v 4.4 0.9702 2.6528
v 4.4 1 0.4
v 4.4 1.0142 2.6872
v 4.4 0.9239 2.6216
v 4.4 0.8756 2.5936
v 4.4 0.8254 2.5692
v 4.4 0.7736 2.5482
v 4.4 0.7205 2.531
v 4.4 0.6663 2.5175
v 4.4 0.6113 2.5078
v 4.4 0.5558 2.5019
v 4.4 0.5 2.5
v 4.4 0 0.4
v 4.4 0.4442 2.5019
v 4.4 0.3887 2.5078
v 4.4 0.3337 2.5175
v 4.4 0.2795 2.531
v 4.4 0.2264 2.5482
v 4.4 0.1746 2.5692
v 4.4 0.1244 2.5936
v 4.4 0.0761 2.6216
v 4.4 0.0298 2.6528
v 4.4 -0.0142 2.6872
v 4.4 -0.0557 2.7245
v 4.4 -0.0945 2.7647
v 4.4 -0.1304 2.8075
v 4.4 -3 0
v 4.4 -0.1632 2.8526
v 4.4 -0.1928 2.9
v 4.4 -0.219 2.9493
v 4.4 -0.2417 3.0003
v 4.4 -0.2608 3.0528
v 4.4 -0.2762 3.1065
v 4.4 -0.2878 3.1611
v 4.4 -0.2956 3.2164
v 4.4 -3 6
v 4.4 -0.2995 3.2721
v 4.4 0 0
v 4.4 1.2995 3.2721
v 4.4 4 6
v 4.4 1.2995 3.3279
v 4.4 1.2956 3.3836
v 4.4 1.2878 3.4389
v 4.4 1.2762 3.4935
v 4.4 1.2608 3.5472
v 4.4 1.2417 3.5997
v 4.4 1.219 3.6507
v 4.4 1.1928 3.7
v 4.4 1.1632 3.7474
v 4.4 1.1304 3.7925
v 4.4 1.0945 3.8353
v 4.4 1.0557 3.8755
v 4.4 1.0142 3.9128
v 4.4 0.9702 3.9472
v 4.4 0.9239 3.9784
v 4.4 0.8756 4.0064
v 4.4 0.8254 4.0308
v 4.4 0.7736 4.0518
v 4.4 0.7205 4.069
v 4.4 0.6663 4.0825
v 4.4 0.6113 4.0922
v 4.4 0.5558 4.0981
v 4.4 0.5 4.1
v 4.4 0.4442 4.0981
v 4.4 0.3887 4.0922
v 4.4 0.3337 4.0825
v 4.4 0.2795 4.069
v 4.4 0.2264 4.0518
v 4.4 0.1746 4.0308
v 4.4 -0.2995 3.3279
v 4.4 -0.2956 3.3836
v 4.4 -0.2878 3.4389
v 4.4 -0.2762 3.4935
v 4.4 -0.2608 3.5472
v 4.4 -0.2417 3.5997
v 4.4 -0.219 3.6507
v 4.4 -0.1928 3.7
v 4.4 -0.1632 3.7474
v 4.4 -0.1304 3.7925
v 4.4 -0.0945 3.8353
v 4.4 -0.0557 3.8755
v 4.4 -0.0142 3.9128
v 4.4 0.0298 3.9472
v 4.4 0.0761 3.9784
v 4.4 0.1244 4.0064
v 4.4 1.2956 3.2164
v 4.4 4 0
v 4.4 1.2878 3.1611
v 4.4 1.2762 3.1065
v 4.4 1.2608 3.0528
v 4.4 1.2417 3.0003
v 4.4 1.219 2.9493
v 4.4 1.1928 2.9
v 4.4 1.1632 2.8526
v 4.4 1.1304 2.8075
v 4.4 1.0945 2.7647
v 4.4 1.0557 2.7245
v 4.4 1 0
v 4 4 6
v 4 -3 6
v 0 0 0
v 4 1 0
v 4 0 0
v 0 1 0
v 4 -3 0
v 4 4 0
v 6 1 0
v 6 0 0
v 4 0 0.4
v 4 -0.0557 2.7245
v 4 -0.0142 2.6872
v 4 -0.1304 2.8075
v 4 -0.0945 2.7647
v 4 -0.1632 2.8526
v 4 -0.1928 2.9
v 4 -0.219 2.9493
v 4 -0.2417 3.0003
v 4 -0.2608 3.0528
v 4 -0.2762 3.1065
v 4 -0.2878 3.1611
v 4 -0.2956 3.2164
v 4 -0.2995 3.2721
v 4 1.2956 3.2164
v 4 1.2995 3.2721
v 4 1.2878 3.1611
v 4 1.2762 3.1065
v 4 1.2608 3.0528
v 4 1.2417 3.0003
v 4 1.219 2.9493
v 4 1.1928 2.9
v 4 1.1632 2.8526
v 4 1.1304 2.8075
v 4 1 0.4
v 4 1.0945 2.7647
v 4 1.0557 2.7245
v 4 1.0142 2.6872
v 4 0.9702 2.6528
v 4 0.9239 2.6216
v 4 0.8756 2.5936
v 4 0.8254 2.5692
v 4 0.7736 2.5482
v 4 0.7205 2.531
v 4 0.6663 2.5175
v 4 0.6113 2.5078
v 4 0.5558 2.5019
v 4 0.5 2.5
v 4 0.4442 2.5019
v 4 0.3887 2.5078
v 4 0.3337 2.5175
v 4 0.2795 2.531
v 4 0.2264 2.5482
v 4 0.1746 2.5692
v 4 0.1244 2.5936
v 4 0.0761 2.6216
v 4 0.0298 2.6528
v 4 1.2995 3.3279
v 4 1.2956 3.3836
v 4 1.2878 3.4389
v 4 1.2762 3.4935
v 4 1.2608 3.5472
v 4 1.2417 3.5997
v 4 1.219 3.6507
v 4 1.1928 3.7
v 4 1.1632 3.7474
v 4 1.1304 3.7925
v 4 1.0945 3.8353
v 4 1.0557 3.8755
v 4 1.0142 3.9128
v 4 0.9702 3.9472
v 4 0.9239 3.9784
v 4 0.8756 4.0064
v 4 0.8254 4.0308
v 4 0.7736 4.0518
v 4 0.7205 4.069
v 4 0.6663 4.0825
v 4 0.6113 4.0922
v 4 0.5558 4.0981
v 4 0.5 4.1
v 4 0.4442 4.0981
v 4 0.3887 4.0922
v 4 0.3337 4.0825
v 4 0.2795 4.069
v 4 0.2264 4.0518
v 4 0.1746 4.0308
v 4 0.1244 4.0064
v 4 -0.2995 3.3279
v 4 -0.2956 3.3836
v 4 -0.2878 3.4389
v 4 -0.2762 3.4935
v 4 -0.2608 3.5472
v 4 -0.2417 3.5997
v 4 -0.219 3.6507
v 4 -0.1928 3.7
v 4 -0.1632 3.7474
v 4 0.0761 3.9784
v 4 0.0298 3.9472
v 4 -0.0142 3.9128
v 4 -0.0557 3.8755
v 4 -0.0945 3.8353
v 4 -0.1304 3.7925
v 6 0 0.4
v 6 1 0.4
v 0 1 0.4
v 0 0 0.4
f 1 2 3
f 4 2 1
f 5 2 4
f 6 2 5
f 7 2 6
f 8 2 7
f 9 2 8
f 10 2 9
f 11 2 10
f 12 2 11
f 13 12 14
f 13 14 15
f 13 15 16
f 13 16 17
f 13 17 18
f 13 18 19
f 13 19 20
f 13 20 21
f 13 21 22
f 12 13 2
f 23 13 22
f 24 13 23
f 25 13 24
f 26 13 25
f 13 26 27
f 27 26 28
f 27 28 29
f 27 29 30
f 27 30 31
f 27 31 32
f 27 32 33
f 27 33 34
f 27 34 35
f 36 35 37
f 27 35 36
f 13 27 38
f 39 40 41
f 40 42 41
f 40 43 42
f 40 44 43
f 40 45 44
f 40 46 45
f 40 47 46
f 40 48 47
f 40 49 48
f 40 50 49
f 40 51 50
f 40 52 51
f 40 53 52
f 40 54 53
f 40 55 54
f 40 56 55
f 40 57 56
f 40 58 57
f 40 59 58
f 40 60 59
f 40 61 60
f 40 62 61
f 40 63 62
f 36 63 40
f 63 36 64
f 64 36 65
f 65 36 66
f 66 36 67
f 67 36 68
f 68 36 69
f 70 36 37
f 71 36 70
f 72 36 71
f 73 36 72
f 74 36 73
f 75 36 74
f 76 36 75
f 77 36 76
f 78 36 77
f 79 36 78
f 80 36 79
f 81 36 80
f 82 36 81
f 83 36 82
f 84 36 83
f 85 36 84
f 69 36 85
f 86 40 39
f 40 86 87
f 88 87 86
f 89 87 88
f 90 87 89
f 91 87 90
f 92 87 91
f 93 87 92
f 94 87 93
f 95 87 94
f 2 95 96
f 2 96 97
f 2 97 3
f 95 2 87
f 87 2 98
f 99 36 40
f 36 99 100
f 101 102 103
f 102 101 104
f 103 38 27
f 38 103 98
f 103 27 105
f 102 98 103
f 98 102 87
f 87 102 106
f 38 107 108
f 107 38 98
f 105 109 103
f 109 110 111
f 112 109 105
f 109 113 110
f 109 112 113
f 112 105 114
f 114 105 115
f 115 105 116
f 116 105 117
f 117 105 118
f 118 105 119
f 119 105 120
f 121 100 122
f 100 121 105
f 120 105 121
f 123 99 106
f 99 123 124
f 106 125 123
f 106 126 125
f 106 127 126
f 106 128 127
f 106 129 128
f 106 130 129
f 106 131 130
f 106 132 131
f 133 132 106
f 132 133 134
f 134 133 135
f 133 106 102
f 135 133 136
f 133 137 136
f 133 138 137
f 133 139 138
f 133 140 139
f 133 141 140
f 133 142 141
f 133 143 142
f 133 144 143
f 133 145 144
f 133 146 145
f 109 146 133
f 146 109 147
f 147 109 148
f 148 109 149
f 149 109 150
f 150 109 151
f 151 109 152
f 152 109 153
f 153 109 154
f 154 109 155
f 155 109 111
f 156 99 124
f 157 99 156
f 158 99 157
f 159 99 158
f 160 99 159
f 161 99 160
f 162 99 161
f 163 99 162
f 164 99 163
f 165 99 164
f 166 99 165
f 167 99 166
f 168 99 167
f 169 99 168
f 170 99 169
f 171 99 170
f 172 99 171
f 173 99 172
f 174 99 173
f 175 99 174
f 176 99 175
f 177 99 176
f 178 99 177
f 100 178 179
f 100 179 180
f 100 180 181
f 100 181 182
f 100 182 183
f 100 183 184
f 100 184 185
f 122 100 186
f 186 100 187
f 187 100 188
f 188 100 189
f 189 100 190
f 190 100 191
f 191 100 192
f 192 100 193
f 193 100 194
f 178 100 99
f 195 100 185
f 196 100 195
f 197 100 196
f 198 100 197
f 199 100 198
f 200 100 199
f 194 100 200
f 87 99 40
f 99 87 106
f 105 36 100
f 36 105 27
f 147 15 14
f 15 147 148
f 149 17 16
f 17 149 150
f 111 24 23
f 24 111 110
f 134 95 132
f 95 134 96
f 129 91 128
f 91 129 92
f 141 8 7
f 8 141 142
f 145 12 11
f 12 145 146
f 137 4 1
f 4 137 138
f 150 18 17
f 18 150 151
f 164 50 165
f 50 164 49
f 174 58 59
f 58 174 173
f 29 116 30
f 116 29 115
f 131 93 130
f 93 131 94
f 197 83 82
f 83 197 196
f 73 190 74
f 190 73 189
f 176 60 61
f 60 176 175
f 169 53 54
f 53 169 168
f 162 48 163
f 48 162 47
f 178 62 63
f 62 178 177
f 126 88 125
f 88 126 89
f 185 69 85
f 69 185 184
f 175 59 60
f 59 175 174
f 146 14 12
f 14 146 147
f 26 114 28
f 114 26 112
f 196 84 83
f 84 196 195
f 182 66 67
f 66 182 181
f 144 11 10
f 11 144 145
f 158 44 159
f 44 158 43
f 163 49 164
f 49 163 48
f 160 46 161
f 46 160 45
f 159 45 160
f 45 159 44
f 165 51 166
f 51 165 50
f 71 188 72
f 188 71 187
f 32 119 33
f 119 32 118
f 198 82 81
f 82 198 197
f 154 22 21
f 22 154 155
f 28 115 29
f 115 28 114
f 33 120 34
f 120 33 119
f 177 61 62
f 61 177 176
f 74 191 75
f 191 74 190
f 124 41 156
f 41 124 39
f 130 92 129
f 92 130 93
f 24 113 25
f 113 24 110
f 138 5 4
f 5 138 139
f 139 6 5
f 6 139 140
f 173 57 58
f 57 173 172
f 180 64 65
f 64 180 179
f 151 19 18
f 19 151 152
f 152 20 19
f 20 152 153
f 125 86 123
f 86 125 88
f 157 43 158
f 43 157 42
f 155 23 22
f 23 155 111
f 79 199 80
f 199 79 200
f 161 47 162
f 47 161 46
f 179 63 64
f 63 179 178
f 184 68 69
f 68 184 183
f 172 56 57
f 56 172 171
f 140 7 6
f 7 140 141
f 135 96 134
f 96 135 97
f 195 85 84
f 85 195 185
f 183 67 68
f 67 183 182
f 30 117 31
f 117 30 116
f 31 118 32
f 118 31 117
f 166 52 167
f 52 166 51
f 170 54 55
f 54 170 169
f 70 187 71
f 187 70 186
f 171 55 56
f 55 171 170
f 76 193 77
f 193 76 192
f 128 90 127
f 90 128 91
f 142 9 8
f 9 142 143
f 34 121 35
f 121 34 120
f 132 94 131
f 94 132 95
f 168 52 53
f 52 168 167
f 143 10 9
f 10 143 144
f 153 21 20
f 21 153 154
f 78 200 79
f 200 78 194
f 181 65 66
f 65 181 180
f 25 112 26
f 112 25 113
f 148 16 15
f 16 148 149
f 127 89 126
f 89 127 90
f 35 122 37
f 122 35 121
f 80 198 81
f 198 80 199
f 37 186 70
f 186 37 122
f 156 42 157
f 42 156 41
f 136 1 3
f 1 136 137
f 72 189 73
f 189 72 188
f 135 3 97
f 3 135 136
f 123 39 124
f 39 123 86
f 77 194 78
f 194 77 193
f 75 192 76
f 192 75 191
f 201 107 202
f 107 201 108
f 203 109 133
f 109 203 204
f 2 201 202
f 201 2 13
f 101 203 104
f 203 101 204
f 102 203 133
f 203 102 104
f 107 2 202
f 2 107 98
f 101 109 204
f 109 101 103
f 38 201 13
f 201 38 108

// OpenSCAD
cube([6,1,0.4]);
 
difference() {
    translate([4,-3,0]) {
        cube([0.4,7,6]);
    }
    
    translate([1,0.5,3.3]) {
        rotate([0,90,0]) {  
            cylinder(11,0.8,0.8         , $fn=90);
        }
    }
}
